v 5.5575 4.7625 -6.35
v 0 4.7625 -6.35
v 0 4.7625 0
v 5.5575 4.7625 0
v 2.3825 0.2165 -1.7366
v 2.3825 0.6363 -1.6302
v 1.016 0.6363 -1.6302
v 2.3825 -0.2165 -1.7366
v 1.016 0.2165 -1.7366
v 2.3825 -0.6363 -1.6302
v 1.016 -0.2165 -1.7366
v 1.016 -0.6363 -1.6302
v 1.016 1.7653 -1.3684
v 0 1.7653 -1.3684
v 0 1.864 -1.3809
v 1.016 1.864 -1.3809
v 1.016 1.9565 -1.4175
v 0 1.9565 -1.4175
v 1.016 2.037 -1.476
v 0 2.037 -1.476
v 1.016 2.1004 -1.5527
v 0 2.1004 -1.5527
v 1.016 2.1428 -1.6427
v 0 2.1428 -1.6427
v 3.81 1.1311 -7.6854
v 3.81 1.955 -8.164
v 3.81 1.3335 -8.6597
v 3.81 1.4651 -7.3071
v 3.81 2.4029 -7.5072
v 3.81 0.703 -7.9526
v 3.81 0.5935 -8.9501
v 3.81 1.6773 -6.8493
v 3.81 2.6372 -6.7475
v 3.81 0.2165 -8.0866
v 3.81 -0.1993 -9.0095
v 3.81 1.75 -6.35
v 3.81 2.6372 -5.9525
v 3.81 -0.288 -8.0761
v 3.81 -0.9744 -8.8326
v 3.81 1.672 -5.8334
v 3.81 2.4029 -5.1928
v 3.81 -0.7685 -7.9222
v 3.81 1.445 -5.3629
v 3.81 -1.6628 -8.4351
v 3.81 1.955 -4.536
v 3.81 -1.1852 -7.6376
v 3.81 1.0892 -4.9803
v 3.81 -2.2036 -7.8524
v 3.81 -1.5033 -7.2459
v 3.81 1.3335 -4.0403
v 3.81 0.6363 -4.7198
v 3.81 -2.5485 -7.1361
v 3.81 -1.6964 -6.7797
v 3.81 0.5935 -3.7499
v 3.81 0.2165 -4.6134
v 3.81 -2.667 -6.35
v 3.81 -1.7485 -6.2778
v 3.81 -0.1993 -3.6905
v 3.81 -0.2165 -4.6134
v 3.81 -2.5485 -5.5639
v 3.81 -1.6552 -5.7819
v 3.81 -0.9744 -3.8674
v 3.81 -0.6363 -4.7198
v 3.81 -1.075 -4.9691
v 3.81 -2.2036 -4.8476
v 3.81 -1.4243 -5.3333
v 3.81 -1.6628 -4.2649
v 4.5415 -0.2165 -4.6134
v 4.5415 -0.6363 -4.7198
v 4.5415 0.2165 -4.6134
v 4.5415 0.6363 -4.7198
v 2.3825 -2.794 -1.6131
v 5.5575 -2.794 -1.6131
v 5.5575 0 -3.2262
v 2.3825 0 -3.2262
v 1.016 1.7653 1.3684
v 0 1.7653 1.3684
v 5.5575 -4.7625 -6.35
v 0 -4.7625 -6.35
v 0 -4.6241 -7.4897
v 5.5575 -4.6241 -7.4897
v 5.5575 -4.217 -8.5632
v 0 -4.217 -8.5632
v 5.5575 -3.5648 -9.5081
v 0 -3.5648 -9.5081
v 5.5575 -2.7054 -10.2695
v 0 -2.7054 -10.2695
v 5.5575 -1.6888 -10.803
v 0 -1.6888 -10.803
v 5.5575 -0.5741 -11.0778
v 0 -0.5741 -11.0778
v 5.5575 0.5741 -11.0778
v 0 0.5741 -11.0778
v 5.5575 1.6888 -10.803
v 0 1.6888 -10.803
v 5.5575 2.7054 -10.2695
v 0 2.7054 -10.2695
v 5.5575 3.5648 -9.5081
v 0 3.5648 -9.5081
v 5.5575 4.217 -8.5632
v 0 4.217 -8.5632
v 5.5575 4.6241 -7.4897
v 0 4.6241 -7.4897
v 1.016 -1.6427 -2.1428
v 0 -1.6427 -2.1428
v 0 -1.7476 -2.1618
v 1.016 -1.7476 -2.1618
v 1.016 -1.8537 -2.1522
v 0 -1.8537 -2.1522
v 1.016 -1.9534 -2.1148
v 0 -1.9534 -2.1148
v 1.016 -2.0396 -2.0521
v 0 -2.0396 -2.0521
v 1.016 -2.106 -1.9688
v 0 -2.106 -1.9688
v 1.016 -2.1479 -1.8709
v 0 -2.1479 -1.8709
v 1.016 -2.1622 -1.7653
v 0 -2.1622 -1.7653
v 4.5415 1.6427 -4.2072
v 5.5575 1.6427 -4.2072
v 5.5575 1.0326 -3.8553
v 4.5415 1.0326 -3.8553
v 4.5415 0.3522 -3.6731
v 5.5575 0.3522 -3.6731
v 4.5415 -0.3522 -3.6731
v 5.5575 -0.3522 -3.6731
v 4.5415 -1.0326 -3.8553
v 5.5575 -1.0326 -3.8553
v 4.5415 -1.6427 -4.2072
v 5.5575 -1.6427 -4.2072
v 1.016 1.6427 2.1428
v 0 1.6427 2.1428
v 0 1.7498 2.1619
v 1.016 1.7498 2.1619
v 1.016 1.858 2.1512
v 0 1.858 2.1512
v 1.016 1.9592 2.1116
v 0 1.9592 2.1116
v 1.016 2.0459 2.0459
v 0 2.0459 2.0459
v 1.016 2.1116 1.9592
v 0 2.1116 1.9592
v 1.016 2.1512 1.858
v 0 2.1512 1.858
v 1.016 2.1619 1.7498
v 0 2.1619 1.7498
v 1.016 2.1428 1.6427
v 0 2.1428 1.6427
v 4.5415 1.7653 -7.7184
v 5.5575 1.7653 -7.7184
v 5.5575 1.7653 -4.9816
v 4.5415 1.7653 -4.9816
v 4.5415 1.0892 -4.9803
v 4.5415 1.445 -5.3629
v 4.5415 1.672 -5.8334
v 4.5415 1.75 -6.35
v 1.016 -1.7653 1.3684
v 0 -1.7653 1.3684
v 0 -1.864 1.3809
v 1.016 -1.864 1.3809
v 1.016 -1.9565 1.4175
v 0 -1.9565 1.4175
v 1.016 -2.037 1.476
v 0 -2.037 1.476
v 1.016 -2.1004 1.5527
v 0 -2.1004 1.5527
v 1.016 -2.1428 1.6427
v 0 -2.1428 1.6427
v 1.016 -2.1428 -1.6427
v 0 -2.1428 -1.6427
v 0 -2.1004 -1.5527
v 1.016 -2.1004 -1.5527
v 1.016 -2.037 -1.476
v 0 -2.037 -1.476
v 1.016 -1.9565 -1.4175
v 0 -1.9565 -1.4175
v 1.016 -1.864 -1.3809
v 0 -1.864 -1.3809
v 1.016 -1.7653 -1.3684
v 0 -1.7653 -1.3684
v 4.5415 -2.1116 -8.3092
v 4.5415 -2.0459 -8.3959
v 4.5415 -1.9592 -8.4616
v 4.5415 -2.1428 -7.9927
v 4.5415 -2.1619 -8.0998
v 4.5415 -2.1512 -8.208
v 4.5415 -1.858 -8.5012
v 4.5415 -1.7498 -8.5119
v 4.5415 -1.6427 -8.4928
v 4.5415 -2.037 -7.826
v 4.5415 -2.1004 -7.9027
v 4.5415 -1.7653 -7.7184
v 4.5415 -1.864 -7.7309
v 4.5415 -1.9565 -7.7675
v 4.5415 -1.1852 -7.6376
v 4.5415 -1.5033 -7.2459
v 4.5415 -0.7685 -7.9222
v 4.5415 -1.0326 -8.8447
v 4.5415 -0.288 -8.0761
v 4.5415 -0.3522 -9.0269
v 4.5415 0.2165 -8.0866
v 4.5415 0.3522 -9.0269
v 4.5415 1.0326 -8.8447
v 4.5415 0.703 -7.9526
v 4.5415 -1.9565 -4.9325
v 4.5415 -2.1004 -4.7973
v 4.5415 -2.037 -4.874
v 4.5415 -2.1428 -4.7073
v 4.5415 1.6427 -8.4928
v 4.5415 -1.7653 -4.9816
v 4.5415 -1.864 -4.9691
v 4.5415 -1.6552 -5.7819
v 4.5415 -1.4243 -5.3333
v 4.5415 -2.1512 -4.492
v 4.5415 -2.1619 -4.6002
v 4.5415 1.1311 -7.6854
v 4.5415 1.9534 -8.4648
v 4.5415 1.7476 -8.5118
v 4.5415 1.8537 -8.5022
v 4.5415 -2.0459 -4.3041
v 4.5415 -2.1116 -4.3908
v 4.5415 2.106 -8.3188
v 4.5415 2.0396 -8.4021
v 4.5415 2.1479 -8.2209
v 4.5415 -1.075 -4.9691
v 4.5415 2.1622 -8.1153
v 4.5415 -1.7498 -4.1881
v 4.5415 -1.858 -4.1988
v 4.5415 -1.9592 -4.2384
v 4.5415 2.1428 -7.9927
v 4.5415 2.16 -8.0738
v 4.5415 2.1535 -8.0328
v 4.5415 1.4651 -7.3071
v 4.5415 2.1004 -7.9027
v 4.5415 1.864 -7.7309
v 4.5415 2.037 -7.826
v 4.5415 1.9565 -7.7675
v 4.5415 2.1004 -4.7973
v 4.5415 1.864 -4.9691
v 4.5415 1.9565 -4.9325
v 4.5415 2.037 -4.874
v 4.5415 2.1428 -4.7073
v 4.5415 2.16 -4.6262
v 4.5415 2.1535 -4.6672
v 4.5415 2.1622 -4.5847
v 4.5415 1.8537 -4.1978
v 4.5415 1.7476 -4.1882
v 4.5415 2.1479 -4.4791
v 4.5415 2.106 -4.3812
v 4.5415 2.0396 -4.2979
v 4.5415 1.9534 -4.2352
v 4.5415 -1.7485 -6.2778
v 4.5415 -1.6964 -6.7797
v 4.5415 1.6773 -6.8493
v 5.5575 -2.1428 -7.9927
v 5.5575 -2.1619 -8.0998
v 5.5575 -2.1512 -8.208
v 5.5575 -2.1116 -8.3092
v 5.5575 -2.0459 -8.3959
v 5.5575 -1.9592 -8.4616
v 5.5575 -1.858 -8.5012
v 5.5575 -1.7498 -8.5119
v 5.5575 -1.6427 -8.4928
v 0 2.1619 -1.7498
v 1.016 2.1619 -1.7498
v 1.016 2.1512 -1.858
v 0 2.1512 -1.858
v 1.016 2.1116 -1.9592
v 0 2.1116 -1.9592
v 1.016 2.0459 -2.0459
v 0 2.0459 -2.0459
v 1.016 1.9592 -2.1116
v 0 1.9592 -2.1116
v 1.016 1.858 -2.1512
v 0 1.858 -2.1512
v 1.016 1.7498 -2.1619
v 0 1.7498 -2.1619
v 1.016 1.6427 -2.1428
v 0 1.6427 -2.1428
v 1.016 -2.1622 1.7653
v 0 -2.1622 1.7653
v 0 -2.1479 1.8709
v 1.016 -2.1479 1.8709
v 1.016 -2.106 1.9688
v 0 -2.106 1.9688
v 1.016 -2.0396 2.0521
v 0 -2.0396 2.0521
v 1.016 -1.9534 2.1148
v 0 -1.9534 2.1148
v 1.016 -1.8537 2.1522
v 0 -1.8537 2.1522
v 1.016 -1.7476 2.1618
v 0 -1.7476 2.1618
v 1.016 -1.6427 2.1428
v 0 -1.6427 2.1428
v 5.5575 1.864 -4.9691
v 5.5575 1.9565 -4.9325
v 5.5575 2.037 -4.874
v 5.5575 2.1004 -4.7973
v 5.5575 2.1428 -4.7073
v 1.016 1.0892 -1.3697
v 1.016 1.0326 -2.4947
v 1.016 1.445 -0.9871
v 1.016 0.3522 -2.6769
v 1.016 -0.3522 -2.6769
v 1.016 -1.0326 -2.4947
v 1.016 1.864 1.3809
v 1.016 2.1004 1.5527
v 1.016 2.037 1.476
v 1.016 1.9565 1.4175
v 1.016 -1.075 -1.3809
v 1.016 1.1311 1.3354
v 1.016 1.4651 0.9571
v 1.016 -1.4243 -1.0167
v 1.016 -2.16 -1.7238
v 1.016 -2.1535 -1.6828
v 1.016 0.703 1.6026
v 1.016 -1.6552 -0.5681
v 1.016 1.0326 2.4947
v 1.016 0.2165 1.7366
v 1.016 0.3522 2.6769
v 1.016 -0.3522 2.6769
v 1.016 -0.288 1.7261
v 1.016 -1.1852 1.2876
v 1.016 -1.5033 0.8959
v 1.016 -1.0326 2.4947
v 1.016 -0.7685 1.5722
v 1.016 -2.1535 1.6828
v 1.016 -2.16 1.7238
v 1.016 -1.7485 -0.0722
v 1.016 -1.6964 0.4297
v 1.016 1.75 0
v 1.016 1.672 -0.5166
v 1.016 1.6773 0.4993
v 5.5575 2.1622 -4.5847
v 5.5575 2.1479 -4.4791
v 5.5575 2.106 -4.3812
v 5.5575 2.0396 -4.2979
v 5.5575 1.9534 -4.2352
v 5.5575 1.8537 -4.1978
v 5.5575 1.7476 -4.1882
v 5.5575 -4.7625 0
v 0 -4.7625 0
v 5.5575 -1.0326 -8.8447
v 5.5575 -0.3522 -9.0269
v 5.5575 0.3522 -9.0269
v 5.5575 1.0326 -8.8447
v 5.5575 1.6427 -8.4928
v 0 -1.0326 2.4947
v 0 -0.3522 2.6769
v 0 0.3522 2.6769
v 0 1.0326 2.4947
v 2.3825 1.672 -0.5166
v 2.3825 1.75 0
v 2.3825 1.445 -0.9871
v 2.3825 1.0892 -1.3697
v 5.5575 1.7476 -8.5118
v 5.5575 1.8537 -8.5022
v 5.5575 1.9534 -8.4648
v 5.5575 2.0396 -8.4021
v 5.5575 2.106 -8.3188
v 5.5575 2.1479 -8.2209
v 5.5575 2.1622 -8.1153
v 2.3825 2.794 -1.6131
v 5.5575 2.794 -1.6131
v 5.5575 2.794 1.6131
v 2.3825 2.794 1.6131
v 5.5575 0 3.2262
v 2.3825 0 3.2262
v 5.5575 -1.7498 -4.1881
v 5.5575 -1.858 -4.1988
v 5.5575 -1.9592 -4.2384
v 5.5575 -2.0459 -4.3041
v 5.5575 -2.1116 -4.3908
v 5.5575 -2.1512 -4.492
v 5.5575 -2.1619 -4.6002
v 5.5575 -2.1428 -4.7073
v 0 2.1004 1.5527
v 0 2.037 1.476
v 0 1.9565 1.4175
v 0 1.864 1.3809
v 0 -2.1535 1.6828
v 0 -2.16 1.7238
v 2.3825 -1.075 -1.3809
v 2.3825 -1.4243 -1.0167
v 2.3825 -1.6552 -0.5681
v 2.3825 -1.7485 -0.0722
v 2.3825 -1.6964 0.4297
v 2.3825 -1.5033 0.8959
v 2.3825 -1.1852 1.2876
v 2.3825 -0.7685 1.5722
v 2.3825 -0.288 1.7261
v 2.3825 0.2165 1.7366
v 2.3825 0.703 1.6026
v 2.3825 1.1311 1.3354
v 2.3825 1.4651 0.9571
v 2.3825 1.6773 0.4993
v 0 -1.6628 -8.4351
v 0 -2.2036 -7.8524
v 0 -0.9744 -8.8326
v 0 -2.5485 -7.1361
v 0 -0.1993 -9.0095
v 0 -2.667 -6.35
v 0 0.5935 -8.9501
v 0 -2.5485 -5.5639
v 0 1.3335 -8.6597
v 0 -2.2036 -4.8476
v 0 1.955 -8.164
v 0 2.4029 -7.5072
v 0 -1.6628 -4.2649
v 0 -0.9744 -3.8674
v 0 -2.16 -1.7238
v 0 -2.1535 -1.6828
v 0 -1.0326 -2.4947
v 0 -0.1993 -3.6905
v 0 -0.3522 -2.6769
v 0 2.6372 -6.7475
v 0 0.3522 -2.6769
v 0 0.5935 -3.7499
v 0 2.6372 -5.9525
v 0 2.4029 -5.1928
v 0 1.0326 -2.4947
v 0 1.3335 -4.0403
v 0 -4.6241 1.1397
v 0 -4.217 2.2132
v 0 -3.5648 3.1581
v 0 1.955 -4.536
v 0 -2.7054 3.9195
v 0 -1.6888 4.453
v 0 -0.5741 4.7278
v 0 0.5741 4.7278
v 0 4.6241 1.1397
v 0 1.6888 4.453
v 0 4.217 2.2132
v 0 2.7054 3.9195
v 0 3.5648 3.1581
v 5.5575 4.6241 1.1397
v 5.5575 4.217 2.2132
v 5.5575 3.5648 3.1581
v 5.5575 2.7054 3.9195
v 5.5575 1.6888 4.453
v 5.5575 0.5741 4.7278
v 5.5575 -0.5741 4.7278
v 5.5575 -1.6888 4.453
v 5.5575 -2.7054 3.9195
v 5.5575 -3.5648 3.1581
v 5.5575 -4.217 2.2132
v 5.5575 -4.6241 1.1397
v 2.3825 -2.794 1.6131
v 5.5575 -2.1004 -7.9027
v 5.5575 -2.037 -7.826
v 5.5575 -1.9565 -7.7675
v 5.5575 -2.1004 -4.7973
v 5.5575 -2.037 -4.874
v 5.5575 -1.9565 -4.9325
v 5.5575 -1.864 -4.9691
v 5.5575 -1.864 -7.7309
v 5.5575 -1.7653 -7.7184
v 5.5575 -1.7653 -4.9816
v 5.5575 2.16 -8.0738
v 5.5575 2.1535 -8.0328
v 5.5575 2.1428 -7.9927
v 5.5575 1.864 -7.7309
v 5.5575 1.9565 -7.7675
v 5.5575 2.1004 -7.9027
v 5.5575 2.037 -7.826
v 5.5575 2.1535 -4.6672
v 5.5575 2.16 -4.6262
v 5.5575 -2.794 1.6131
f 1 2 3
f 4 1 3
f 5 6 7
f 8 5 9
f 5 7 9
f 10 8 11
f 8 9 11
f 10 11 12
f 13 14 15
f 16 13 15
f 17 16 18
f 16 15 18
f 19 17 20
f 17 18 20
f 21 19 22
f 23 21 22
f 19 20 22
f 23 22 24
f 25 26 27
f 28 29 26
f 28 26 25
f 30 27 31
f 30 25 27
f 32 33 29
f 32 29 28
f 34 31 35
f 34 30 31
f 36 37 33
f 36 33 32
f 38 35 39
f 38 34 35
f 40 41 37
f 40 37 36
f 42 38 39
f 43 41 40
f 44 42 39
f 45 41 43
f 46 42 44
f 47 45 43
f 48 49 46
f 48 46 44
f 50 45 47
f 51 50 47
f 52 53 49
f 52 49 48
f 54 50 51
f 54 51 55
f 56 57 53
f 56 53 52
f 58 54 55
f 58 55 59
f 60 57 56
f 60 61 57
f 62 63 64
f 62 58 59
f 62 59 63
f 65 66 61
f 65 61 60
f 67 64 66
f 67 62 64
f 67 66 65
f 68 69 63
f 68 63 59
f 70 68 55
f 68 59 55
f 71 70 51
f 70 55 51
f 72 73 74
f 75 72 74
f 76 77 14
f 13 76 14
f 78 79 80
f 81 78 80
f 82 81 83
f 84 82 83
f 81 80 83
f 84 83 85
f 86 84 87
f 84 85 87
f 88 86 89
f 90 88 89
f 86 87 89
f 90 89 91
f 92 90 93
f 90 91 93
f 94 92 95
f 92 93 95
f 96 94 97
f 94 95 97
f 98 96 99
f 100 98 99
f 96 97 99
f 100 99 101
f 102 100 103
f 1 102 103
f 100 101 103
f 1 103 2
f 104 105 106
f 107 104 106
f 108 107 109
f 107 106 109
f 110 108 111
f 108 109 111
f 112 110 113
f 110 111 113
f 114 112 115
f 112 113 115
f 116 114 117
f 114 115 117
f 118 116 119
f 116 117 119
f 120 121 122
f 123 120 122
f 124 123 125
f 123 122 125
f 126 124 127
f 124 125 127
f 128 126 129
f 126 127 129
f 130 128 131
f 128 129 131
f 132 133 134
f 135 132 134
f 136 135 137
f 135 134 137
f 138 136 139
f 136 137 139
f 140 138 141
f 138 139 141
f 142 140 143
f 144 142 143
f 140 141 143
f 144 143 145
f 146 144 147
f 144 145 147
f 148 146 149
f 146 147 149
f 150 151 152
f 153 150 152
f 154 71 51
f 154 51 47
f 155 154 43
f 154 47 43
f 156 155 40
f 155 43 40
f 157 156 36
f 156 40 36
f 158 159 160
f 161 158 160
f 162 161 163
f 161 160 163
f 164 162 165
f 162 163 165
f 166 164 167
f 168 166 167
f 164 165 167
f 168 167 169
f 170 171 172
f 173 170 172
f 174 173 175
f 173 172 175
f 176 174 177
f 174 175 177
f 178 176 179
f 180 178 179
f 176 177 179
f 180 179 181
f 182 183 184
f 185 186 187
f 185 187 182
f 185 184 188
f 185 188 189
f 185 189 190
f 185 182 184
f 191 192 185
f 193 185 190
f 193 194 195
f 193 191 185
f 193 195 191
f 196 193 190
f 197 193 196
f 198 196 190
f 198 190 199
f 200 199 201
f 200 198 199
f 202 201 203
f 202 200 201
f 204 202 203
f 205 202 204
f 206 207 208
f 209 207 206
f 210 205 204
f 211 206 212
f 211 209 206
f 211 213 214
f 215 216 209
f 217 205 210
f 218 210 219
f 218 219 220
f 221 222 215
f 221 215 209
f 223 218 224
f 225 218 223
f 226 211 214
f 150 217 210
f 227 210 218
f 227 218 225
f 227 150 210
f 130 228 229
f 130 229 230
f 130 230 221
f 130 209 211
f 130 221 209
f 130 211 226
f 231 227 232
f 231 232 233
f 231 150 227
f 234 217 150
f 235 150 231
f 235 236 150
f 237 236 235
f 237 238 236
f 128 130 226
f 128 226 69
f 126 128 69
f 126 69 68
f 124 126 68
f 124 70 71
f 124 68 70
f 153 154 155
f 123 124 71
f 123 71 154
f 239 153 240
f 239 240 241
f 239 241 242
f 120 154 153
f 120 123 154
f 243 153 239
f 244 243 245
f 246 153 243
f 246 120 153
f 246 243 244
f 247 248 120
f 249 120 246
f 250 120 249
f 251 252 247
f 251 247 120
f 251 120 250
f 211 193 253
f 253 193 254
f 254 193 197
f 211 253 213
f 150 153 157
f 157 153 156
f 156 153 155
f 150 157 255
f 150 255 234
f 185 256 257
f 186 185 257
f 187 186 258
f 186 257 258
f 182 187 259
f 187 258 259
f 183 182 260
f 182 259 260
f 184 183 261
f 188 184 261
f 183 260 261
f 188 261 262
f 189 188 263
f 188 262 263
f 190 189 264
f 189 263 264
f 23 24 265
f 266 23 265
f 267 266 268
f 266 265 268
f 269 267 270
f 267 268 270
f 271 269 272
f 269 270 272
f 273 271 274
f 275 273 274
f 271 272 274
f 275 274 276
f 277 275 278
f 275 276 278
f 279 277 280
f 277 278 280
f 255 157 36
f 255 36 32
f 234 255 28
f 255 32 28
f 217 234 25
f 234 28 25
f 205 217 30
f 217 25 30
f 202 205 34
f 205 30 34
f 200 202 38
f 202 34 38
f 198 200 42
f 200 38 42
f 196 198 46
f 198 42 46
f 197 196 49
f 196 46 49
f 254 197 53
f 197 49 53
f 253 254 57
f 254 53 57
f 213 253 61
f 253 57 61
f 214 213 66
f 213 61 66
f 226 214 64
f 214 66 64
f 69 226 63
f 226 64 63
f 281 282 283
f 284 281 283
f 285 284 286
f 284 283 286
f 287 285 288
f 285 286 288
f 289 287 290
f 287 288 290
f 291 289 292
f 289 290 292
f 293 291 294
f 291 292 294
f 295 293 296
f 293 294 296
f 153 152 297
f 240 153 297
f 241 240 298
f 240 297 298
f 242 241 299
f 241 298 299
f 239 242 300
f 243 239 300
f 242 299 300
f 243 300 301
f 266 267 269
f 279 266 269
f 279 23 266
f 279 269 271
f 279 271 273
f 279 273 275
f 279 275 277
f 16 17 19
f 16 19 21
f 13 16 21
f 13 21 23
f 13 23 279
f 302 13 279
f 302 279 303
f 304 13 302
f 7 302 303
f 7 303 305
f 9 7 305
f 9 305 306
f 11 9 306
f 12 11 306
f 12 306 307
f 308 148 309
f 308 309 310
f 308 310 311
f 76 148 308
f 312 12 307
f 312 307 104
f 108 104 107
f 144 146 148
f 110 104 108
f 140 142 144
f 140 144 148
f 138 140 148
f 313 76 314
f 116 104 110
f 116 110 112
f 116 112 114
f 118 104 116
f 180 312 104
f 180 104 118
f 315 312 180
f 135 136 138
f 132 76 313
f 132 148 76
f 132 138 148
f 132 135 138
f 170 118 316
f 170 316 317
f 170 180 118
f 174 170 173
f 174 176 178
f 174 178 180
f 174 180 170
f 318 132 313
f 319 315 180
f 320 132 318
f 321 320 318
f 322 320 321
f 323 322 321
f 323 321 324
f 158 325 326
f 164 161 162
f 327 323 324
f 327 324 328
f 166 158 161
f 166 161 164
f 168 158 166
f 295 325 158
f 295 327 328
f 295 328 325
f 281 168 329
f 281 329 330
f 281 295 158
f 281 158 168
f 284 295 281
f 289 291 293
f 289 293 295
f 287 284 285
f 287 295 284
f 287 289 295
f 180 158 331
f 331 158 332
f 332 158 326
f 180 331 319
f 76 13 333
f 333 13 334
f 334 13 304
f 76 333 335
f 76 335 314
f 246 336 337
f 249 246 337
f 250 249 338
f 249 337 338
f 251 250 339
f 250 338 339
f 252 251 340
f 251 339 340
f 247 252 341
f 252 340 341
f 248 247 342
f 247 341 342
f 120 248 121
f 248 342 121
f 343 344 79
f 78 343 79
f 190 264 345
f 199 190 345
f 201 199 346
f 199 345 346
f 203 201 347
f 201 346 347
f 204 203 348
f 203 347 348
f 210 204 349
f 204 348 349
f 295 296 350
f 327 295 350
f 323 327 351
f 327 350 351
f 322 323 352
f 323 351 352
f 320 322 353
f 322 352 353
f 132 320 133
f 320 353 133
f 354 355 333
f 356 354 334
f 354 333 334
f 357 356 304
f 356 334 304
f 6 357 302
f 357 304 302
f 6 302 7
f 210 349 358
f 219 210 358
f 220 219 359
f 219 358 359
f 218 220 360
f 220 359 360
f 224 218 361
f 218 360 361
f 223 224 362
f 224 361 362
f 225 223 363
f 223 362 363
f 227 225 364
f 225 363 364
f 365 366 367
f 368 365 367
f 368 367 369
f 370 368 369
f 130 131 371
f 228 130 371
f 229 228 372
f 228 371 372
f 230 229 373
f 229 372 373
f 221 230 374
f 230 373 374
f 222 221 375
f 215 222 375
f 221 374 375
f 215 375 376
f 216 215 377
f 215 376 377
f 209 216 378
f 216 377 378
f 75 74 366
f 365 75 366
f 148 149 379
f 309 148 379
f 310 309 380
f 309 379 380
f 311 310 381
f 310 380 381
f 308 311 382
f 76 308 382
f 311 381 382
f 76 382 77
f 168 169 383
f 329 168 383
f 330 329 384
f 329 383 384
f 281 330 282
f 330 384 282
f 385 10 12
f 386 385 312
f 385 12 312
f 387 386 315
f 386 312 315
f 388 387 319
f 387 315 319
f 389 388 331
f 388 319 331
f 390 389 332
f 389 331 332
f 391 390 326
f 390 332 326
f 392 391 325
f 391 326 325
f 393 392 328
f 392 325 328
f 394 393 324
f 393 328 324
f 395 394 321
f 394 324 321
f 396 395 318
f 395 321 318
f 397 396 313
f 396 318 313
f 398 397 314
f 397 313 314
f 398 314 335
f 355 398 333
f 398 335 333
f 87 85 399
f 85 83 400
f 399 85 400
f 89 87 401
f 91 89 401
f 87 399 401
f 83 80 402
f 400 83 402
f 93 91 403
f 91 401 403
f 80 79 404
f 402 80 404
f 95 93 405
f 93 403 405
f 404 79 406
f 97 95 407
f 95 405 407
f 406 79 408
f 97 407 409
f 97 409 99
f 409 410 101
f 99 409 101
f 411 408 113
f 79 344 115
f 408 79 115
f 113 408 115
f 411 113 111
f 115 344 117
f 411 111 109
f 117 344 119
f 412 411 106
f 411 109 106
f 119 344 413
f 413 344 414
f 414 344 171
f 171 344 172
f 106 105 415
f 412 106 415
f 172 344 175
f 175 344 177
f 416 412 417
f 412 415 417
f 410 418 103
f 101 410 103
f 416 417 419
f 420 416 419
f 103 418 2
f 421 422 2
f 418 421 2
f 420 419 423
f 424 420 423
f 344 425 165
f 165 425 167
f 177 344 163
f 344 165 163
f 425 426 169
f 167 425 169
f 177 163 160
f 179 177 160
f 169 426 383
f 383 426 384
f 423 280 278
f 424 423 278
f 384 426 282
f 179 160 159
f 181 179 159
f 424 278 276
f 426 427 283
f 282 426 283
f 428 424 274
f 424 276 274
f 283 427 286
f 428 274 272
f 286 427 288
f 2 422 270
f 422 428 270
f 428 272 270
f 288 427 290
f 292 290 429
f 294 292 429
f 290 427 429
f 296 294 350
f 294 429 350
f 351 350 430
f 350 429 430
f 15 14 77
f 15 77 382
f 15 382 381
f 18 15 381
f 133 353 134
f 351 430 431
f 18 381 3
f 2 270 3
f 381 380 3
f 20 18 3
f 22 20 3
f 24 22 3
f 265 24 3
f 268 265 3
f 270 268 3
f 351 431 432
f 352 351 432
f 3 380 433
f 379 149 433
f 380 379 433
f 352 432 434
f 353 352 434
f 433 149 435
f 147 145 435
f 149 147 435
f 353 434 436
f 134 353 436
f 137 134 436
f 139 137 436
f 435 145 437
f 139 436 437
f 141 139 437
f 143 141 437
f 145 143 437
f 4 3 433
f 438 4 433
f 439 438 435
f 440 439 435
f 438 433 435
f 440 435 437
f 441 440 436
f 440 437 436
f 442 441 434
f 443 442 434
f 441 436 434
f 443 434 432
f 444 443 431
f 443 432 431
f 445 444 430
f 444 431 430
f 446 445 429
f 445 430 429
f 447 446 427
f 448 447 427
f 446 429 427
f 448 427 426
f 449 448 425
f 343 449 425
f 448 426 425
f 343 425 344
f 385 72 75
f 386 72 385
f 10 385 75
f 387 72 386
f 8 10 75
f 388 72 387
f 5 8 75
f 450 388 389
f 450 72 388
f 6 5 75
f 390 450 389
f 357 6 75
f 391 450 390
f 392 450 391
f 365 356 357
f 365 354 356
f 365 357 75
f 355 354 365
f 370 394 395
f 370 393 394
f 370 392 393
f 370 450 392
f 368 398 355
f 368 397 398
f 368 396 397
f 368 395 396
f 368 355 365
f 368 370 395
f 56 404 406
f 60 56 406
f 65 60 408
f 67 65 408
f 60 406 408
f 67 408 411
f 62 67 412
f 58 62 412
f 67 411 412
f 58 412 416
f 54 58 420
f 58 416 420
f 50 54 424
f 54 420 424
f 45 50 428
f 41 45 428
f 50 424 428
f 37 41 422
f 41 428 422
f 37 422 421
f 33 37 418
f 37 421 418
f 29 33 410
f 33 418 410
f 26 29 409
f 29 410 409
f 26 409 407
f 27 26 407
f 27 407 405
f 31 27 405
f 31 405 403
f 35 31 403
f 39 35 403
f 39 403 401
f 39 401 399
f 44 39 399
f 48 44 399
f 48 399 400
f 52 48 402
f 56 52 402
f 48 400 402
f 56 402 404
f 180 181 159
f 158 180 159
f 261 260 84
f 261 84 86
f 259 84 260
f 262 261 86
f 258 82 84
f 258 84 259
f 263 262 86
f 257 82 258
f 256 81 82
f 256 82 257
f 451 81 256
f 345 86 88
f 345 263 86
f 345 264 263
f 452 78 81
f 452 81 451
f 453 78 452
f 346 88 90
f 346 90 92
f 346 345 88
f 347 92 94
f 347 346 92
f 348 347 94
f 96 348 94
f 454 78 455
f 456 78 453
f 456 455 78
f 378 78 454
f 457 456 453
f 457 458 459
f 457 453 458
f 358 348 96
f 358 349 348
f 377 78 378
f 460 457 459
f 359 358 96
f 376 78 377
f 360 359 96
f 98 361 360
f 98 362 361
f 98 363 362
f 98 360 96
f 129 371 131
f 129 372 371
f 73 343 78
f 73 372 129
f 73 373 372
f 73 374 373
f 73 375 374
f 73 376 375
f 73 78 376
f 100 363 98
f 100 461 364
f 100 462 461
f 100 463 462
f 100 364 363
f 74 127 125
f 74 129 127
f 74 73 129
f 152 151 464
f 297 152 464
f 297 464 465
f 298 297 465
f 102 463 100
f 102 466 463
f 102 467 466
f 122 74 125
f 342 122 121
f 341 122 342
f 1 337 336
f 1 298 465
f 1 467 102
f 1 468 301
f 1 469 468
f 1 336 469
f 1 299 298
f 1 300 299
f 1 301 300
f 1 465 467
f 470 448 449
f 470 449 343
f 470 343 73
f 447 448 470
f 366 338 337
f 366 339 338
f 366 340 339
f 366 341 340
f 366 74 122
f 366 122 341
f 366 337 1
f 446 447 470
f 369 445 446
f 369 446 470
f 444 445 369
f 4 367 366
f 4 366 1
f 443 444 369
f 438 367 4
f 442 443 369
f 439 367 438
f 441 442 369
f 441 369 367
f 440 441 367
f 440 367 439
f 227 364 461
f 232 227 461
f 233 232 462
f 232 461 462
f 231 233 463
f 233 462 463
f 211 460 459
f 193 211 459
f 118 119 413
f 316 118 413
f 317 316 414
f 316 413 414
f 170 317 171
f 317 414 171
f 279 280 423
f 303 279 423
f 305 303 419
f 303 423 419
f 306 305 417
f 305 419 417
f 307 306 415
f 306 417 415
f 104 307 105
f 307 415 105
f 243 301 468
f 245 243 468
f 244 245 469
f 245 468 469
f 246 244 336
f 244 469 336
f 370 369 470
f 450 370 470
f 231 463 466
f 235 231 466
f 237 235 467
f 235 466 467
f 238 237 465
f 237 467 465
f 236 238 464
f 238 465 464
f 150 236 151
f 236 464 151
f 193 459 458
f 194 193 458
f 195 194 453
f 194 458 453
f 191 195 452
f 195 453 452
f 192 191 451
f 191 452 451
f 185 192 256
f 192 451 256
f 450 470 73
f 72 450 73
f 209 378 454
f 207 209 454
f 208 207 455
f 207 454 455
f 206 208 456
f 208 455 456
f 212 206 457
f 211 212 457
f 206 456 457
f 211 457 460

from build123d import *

# Parameters (mm, degrees)
F1_DEPTH = 5.55752
F2_R     = 1.75
F3_DEPTH = 1.016
F4_R     = 1.75
F5_DEPTH = 1.016
F6_DEPTH = 3.175
F7_R     = 2.667
F7_R_2   = 1.75
F8_DEPTH = 3.81


# Not quite as in the source:
# - a feature names something its author has since deleted; it is built from what else it names


with BuildPart() as f1:
    # F0 (on Right) → F1 (new body)
    with BuildSketch(Plane.YZ):
        with BuildLine():
            ThreePointArc((0.636344373, -4.7197957677), (2.2310225415, -4.2076055743), (3.5497579143, -3.175))
            ThreePointArc((3.5497579143, -3.175), (2.2310225415, -2.1423944257), (0.636344373, -1.6302042323))
            ThreePointArc((0.636344373, -1.6302042323), (0, -1.75), (-0.636344373, -1.6302042323))
            ThreePointArc((-0.636344373, -1.6302042323), (-2.2310225415, -2.1423944257), (-3.5497579143, -3.175))
            ThreePointArc((-3.5497579143, -3.175), (-2.2310225415, -4.2076055743), (-0.636344373, -4.7197957677))
            ThreePointArc((-0.636344373, -4.7197957677), (0, -4.6), (0.636344373, -4.7197957677))
        make_face()
        with BuildLine():
            ThreePointArc((3.5497579143, -3.175), (4.4489958596, -1.6993652025), (4.7625, 0))
            ThreePointArc((4.7625, 0), (0, 4.7625), (-4.7625, 0))
            ThreePointArc((-4.7625, 0), (-4.4489958596, -1.6993652025), (-3.5497579143, -3.175))
            ThreePointArc((-3.5497579143, -3.175), (-2.2310225415, -2.1423944257), (-0.636344373, -1.6302042323))
            ThreePointArc((-0.636344373, -1.6302042323), (-0.9871416685, 1.4450091094), (1.75, 0))
            ThreePointArc((1.75, 0), (1.4450091094, -0.9871416685), (0.636344373, -1.6302042323))
            ThreePointArc((0.636344373, -1.6302042323), (2.2310225415, -2.1423944257), (3.5497579143, -3.175))
        make_face()
        with BuildLine():
            Line((4.7625, -6.35), (4.7625, 0))
            ThreePointArc((4.7625, 0), (4.4489958596, -1.6993652025), (3.5497579143, -3.175))
            ThreePointArc((3.5497579143, -3.175), (4.4489958596, -4.6506347975), (4.7625, -6.35))
        make_face()
        with BuildLine():
            ThreePointArc((4.7625, -6.35), (4.4489958596, -4.6506347975), (3.5497579143, -3.175))
            ThreePointArc((3.5497579143, -3.175), (2.2310225415, -4.2076055743), (0.636344373, -4.7197957677))
            ThreePointArc((0.636344373, -4.7197957677), (1.4450091094, -5.3628583315), (1.75, -6.35))
            ThreePointArc((1.75, -6.35), (-0.9871416685, -7.7950091094), (-0.636344373, -4.7197957677))
            ThreePointArc((-0.636344373, -4.7197957677), (-2.2310225415, -4.2076055743), (-3.5497579143, -3.175))
            ThreePointArc((-3.5497579143, -3.175), (-4.4489958596, -4.6506347975), (-4.7625, -6.35))
            ThreePointArc((-4.7625, -6.35), (0, -11.1125), (4.7625, -6.35))
        make_face()
        with BuildLine():
            ThreePointArc((-3.5497579143, -3.175), (-4.4489958596, -1.6993652025), (-4.7625, 0))
            Line((-4.7625, 0), (-4.7625, -6.35))
            ThreePointArc((-4.7625, -6.35), (-4.4489958596, -4.6506347975), (-3.5497579143, -3.175))
        make_face()
    extrude(amount=F1_DEPTH)

    # F2 (on face) → F3 (cut)
    with BuildSketch(Plane.YZ.offset(5.55752)):
        with BuildLine():
            ThreePointArc((1.368425, -4.5847), (1.4846669962, -4.8653330038), (1.7653, -4.981575))
            Line((1.7653, -4.981575), (1.7653, -4.5847))
            Line((1.7653, -4.5847), (1.368425, -4.5847))
        make_face()
        with BuildLine():
            Line((1.7653, -4.5847), (1.7653, -4.981575))
            ThreePointArc((1.7653, -4.981575), (1.9986038099, -4.9057593371), (2.1427708235, -4.7072787218))
            ThreePointArc((2.1427708235, -4.7072787218), (1.9091883092, -4.4408116908), (1.6427212782, -4.2072291765))
            ThreePointArc((1.6427212782, -4.2072291765), (1.4442406629, -4.3513961901), (1.368425, -4.5847))
            Line((1.368425, -4.5847), (1.7653, -4.5847))
        make_face()
        with BuildLine():
            ThreePointArc((1.7653, -7.718425), (1.4846669962, -7.8346669962), (1.368425, -8.1153))
            Line((1.368425, -8.1153), (1.7653, -8.1153))
            Line((1.7653, -8.1153), (1.7653, -7.718425))
        make_face()
        with BuildLine():
            Line((1.7653, -8.1153), (1.368425, -8.1153))
            ThreePointArc((1.368425, -8.1153), (1.4442406629, -8.3486038099), (1.6427212782, -8.4927708235))
            ThreePointArc((1.6427212782, -8.4927708235), (1.9091883092, -8.2591883092), (2.1427708235, -7.9927212782))
            ThreePointArc((2.1427708235, -7.9927212782), (1.9986038099, -7.7942406629), (1.7653, -7.718425))
            Line((1.7653, -7.718425), (1.7653, -8.1153))
        make_face()
        with BuildLine():
            Line((-1.368425, -8.1153), (-1.7653, -8.1153))
            Line((-1.7653, -8.1153), (-1.7653, -7.718425))
            ThreePointArc((-1.7653, -7.718425), (-1.9986038099, -7.7942406629), (-2.1427708235, -7.9927212782))
            ThreePointArc((-2.1427708235, -7.9927212782), (-1.9091883092, -8.2591883092), (-1.6427212782, -8.4927708235))
            ThreePointArc((-1.6427212782, -8.4927708235), (-1.4442406629, -8.3486038099), (-1.368425, -8.1153))
        make_face()
        with BuildLine():
            Line((-1.7653, -7.718425), (-1.7653, -8.1153))
            Line((-1.7653, -8.1153), (-1.368425, -8.1153))
            ThreePointArc((-1.368425, -8.1153), (-1.4846669962, -7.8346669962), (-1.7653, -7.718425))
        make_face()
        with BuildLine():
            Line((-1.7653, -4.5847), (-1.7653, -4.981575))
            ThreePointArc((-1.7653, -4.981575), (-1.4846669962, -4.8653330038), (-1.368425, -4.5847))
            Line((-1.368425, -4.5847), (-1.7653, -4.5847))
        make_face()
        with BuildLine():
            ThreePointArc((-2.1427708235, -4.7072787218), (-1.9986038099, -4.9057593371), (-1.7653, -4.981575))
            Line((-1.7653, -4.981575), (-1.7653, -4.5847))
            Line((-1.7653, -4.5847), (-1.368425, -4.5847))
            ThreePointArc((-1.368425, -4.5847), (-1.4442406629, -4.3513961901), (-1.6427212782, -4.2072291765))
            ThreePointArc((-1.6427212782, -4.2072291765), (-1.9091883092, -4.4408116908), (-2.1427708235, -4.7072787218))
        make_face()
        with BuildLine():
            ThreePointArc((-1.7653, -7.718425), (-1.4846669962, -7.8346669962), (-1.368425, -8.1153))
            Line((-1.368425, -8.1153), (1.368425, -8.1153))
            ThreePointArc((1.368425, -8.1153), (1.4846669962, -7.8346669962), (1.7653, -7.718425))
            Line((1.7653, -7.718425), (1.7653, -4.981575))
            ThreePointArc((1.7653, -4.981575), (1.4846669962, -4.8653330038), (1.368425, -4.5847))
            Line((1.368425, -4.5847), (-1.368425, -4.5847))
            ThreePointArc((-1.368425, -4.5847), (-1.4846669962, -4.8653330038), (-1.7653, -4.981575))
            Line((-1.7653, -4.981575), (-1.7653, -7.718425))
        make_face()
        with Locations((0, -6.35)):
            Circle(F2_R, mode=Mode.SUBTRACT)
        with BuildLine():
            ThreePointArc((-1.6427212782, -4.2072291765), (-2.0459330038, -4.3040669962), (-2.1427708235, -4.7072787218))
            ThreePointArc((-2.1427708235, -4.7072787218), (-1.9091883092, -4.4408116908), (-1.6427212782, -4.2072291765))
        make_face()
        with BuildLine():
            ThreePointArc((1.6427212782, -4.2072291765), (1.9091883092, -4.4408116908), (2.1427708235, -4.7072787218))
            ThreePointArc((2.1427708235, -4.7072787218), (2.1572939405, -4.6467525283), (2.162175, -4.5847))
            ThreePointArc((2.162175, -4.5847), (1.9986038099, -4.2636406629), (1.6427212782, -4.2072291765))
        make_face()
        with BuildLine():
            ThreePointArc((2.1427708235, -7.9927212782), (1.9091883092, -8.2591883092), (1.6427212782, -8.4927708235))
            ThreePointArc((1.6427212782, -8.4927708235), (1.9986038099, -8.4363593371), (2.162175, -8.1153))
            ThreePointArc((2.162175, -8.1153), (2.1572939405, -8.0532474717), (2.1427708235, -7.9927212782))
        make_face()
        with BuildLine():
            ThreePointArc((-2.1427708235, -7.9927212782), (-2.0459330038, -8.3959330038), (-1.6427212782, -8.4927708235))
            ThreePointArc((-1.6427212782, -8.4927708235), (-1.9091883092, -8.2591883092), (-2.1427708235, -7.9927212782))
        make_face()
        with BuildLine():
            ThreePointArc((-1.6427212782, -4.2072291765), (-1.4442406629, -4.3513961901), (-1.368425, -4.5847))
            Line((-1.368425, -4.5847), (1.368425, -4.5847))
            ThreePointArc((1.368425, -4.5847), (1.4442406629, -4.3513961901), (1.6427212782, -4.2072291765))
            ThreePointArc((1.6427212782, -4.2072291765), (0, -3.65), (-1.6427212782, -4.2072291765))
        make_face()
        with BuildLine():
            Line((1.368425, -8.1153), (-1.368425, -8.1153))
            ThreePointArc((-1.368425, -8.1153), (-1.4442406629, -8.3486038099), (-1.6427212782, -8.4927708235))
            ThreePointArc((-1.6427212782, -8.4927708235), (0, -9.05), (1.6427212782, -8.4927708235))
            ThreePointArc((1.6427212782, -8.4927708235), (1.4442406629, -8.3486038099), (1.368425, -8.1153))
        make_face()
    extrude(amount=-F3_DEPTH, mode=Mode.SUBTRACT)

    # F4 (on face) → F5 (cut)
    with BuildSketch(Plane(origin=(0, 0, 0), x_dir=(0, -1, 0), z_dir=(-1, 0, 0))):
        with BuildLine():
            ThreePointArc((1.7653, -1.368425), (1.4846669962, -1.4846669962), (1.368425, -1.7653))
            Line((1.368425, -1.7653), (1.7653, -1.7653))
            Line((1.7653, -1.7653), (1.7653, -1.368425))
        make_face()
        with BuildLine():
            Line((1.7653, -1.7653), (1.368425, -1.7653))
            ThreePointArc((1.368425, -1.7653), (1.4442406629, -1.9986038099), (1.6427212782, -2.1427708235))
            ThreePointArc((1.6427212782, -2.1427708235), (1.9091883092, -1.9091883092), (2.1427708235, -1.6427212782))
            ThreePointArc((2.1427708235, -1.6427212782), (1.9986038099, -1.4442406629), (1.7653, -1.368425))
            Line((1.7653, -1.368425), (1.7653, -1.7653))
        make_face()
        with BuildLine():
            Line((-1.7653, -1.368425), (-1.7653, -1.7653))
            Line((-1.7653, -1.7653), (-1.368425, -1.7653))
            ThreePointArc((-1.368425, -1.7653), (-1.4846669962, -1.4846669962), (-1.7653, -1.368425))
        make_face()
        with BuildLine():
            Line((-1.368425, -1.7653), (-1.7653, -1.7653))
            Line((-1.7653, -1.7653), (-1.7653, -1.368425))
            ThreePointArc((-1.7653, -1.368425), (-1.9986038099, -1.4442406629), (-2.1427708235, -1.6427212782))
            ThreePointArc((-2.1427708235, -1.6427212782), (-1.9091883092, -1.9091883092), (-1.6427212782, -2.1427708235))
            ThreePointArc((-1.6427212782, -2.1427708235), (-1.4442406629, -1.9986038099), (-1.368425, -1.7653))
        make_face()
        with BuildLine():
            Line((-1.7653, 1.7653), (-1.7653, 1.368425))
            ThreePointArc((-1.7653, 1.368425), (-1.4846669962, 1.4846669962), (-1.368425, 1.7653))
            Line((-1.368425, 1.7653), (-1.7653, 1.7653))
        make_face()
        with BuildLine():
            ThreePointArc((-2.1427708235, 1.6427212782), (-1.9986038099, 1.4442406629), (-1.7653, 1.368425))
            Line((-1.7653, 1.368425), (-1.7653, 1.7653))
            Line((-1.7653, 1.7653), (-1.368425, 1.7653))
            ThreePointArc((-1.368425, 1.7653), (-1.4442406629, 1.9986038099), (-1.6427212782, 2.1427708235))
            ThreePointArc((-1.6427212782, 2.1427708235), (-1.9091883092, 1.9091883092), (-2.1427708235, 1.6427212782))
        make_face()
        with BuildLine():
            ThreePointArc((1.368425, 1.7653), (1.4846669962, 1.4846669962), (1.7653, 1.368425))
            Line((1.7653, 1.368425), (1.7653, 1.7653))
            Line((1.7653, 1.7653), (1.368425, 1.7653))
        make_face()
        with BuildLine():
            Line((1.7653, 1.7653), (1.7653, 1.368425))
            ThreePointArc((1.7653, 1.368425), (1.9986038099, 1.4442406629), (2.1427708235, 1.6427212782))
            ThreePointArc((2.1427708235, 1.6427212782), (1.9091883092, 1.9091883092), (1.6427212782, 2.1427708235))
            ThreePointArc((1.6427212782, 2.1427708235), (1.4442406629, 1.9986038099), (1.368425, 1.7653))
            Line((1.368425, 1.7653), (1.7653, 1.7653))
        make_face()
        with BuildLine():
            ThreePointArc((-1.7653, -1.368425), (-1.4846669962, -1.4846669962), (-1.368425, -1.7653))
            Line((-1.368425, -1.7653), (1.368425, -1.7653))
            ThreePointArc((1.368425, -1.7653), (1.4846669962, -1.4846669962), (1.7653, -1.368425))
            Line((1.7653, -1.368425), (1.7653, 1.368425))
            ThreePointArc((1.7653, 1.368425), (1.4846669962, 1.4846669962), (1.368425, 1.7653))
            Line((1.368425, 1.7653), (-1.368425, 1.7653))
            ThreePointArc((-1.368425, 1.7653), (-1.4846669962, 1.4846669962), (-1.7653, 1.368425))
            Line((-1.7653, 1.368425), (-1.7653, -1.368425))
        make_face()
        Circle(F4_R, mode=Mode.SUBTRACT)
        with BuildLine():
            ThreePointArc((-1.6427212782, 2.1427708235), (-2.0459330038, 2.0459330038), (-2.1427708235, 1.6427212782))
            ThreePointArc((-2.1427708235, 1.6427212782), (-1.9091883092, 1.9091883092), (-1.6427212782, 2.1427708235))
        make_face()
        with BuildLine():
            ThreePointArc((1.6427212782, 2.1427708235), (1.9091883092, 1.9091883092), (2.1427708235, 1.6427212782))
            ThreePointArc((2.1427708235, 1.6427212782), (2.1572939405, 1.7032474717), (2.162175, 1.7653))
            ThreePointArc((2.162175, 1.7653), (1.9986038099, 2.0863593371), (1.6427212782, 2.1427708235))
        make_face()
        with BuildLine():
            ThreePointArc((2.1427708235, -1.6427212782), (1.9091883092, -1.9091883092), (1.6427212782, -2.1427708235))
            ThreePointArc((1.6427212782, -2.1427708235), (1.9986038099, -2.0863593371), (2.162175, -1.7653))
            ThreePointArc((2.162175, -1.7653), (2.1572939405, -1.7032474717), (2.1427708235, -1.6427212782))
        make_face()
        with BuildLine():
            ThreePointArc((-2.1427708235, -1.6427212782), (-2.0459330038, -2.0459330038), (-1.6427212782, -2.1427708235))
            ThreePointArc((-1.6427212782, -2.1427708235), (-1.9091883092, -1.9091883092), (-2.1427708235, -1.6427212782))
        make_face()
        with BuildLine():
            Line((1.368425, -1.7653), (-1.368425, -1.7653))
            ThreePointArc((-1.368425, -1.7653), (-1.4442406629, -1.9986038099), (-1.6427212782, -2.1427708235))
            ThreePointArc((-1.6427212782, -2.1427708235), (0, -2.7), (1.6427212782, -2.1427708235))
            ThreePointArc((1.6427212782, -2.1427708235), (1.4442406629, -1.9986038099), (1.368425, -1.7653))
        make_face()
        with BuildLine():
            ThreePointArc((-1.6427212782, 2.1427708235), (-1.4442406629, 1.9986038099), (-1.368425, 1.7653))
            Line((-1.368425, 1.7653), (1.368425, 1.7653))
            ThreePointArc((1.368425, 1.7653), (1.4442406629, 1.9986038099), (1.6427212782, 2.1427708235))
            ThreePointArc((1.6427212782, 2.1427708235), (0, 2.7), (-1.6427212782, 2.1427708235))
        make_face()
    extrude(amount=-F5_DEPTH, mode=Mode.SUBTRACT)

    # F2 (on face) → F6 (cut)
    with BuildSketch(Plane.YZ.offset(5.55752)):
        Polygon((-2.794, -1.6131166521), (0, -3.2262333042), (2.794, -1.6131166521), (2.794, 1.6131166521), (0, 3.2262333042), (-2.794, 1.6131166521), align=None)
        Circle(F2_R, mode=Mode.SUBTRACT)
    extrude(amount=-F6_DEPTH, mode=Mode.SUBTRACT)

    # F7 (on face) → F8 (cut)
    with BuildSketch(Plane(origin=(0, 0, 0), x_dir=(0, -1, 0), z_dir=(-1, 0, 0))):
        with Locations((0, -6.35)):
            Circle(F7_R)
        with Locations((0, -6.35)):
            Circle(F7_R_2, mode=Mode.SUBTRACT)
    extrude(amount=-F8_DEPTH, mode=Mode.SUBTRACT)


solid = f1.part
